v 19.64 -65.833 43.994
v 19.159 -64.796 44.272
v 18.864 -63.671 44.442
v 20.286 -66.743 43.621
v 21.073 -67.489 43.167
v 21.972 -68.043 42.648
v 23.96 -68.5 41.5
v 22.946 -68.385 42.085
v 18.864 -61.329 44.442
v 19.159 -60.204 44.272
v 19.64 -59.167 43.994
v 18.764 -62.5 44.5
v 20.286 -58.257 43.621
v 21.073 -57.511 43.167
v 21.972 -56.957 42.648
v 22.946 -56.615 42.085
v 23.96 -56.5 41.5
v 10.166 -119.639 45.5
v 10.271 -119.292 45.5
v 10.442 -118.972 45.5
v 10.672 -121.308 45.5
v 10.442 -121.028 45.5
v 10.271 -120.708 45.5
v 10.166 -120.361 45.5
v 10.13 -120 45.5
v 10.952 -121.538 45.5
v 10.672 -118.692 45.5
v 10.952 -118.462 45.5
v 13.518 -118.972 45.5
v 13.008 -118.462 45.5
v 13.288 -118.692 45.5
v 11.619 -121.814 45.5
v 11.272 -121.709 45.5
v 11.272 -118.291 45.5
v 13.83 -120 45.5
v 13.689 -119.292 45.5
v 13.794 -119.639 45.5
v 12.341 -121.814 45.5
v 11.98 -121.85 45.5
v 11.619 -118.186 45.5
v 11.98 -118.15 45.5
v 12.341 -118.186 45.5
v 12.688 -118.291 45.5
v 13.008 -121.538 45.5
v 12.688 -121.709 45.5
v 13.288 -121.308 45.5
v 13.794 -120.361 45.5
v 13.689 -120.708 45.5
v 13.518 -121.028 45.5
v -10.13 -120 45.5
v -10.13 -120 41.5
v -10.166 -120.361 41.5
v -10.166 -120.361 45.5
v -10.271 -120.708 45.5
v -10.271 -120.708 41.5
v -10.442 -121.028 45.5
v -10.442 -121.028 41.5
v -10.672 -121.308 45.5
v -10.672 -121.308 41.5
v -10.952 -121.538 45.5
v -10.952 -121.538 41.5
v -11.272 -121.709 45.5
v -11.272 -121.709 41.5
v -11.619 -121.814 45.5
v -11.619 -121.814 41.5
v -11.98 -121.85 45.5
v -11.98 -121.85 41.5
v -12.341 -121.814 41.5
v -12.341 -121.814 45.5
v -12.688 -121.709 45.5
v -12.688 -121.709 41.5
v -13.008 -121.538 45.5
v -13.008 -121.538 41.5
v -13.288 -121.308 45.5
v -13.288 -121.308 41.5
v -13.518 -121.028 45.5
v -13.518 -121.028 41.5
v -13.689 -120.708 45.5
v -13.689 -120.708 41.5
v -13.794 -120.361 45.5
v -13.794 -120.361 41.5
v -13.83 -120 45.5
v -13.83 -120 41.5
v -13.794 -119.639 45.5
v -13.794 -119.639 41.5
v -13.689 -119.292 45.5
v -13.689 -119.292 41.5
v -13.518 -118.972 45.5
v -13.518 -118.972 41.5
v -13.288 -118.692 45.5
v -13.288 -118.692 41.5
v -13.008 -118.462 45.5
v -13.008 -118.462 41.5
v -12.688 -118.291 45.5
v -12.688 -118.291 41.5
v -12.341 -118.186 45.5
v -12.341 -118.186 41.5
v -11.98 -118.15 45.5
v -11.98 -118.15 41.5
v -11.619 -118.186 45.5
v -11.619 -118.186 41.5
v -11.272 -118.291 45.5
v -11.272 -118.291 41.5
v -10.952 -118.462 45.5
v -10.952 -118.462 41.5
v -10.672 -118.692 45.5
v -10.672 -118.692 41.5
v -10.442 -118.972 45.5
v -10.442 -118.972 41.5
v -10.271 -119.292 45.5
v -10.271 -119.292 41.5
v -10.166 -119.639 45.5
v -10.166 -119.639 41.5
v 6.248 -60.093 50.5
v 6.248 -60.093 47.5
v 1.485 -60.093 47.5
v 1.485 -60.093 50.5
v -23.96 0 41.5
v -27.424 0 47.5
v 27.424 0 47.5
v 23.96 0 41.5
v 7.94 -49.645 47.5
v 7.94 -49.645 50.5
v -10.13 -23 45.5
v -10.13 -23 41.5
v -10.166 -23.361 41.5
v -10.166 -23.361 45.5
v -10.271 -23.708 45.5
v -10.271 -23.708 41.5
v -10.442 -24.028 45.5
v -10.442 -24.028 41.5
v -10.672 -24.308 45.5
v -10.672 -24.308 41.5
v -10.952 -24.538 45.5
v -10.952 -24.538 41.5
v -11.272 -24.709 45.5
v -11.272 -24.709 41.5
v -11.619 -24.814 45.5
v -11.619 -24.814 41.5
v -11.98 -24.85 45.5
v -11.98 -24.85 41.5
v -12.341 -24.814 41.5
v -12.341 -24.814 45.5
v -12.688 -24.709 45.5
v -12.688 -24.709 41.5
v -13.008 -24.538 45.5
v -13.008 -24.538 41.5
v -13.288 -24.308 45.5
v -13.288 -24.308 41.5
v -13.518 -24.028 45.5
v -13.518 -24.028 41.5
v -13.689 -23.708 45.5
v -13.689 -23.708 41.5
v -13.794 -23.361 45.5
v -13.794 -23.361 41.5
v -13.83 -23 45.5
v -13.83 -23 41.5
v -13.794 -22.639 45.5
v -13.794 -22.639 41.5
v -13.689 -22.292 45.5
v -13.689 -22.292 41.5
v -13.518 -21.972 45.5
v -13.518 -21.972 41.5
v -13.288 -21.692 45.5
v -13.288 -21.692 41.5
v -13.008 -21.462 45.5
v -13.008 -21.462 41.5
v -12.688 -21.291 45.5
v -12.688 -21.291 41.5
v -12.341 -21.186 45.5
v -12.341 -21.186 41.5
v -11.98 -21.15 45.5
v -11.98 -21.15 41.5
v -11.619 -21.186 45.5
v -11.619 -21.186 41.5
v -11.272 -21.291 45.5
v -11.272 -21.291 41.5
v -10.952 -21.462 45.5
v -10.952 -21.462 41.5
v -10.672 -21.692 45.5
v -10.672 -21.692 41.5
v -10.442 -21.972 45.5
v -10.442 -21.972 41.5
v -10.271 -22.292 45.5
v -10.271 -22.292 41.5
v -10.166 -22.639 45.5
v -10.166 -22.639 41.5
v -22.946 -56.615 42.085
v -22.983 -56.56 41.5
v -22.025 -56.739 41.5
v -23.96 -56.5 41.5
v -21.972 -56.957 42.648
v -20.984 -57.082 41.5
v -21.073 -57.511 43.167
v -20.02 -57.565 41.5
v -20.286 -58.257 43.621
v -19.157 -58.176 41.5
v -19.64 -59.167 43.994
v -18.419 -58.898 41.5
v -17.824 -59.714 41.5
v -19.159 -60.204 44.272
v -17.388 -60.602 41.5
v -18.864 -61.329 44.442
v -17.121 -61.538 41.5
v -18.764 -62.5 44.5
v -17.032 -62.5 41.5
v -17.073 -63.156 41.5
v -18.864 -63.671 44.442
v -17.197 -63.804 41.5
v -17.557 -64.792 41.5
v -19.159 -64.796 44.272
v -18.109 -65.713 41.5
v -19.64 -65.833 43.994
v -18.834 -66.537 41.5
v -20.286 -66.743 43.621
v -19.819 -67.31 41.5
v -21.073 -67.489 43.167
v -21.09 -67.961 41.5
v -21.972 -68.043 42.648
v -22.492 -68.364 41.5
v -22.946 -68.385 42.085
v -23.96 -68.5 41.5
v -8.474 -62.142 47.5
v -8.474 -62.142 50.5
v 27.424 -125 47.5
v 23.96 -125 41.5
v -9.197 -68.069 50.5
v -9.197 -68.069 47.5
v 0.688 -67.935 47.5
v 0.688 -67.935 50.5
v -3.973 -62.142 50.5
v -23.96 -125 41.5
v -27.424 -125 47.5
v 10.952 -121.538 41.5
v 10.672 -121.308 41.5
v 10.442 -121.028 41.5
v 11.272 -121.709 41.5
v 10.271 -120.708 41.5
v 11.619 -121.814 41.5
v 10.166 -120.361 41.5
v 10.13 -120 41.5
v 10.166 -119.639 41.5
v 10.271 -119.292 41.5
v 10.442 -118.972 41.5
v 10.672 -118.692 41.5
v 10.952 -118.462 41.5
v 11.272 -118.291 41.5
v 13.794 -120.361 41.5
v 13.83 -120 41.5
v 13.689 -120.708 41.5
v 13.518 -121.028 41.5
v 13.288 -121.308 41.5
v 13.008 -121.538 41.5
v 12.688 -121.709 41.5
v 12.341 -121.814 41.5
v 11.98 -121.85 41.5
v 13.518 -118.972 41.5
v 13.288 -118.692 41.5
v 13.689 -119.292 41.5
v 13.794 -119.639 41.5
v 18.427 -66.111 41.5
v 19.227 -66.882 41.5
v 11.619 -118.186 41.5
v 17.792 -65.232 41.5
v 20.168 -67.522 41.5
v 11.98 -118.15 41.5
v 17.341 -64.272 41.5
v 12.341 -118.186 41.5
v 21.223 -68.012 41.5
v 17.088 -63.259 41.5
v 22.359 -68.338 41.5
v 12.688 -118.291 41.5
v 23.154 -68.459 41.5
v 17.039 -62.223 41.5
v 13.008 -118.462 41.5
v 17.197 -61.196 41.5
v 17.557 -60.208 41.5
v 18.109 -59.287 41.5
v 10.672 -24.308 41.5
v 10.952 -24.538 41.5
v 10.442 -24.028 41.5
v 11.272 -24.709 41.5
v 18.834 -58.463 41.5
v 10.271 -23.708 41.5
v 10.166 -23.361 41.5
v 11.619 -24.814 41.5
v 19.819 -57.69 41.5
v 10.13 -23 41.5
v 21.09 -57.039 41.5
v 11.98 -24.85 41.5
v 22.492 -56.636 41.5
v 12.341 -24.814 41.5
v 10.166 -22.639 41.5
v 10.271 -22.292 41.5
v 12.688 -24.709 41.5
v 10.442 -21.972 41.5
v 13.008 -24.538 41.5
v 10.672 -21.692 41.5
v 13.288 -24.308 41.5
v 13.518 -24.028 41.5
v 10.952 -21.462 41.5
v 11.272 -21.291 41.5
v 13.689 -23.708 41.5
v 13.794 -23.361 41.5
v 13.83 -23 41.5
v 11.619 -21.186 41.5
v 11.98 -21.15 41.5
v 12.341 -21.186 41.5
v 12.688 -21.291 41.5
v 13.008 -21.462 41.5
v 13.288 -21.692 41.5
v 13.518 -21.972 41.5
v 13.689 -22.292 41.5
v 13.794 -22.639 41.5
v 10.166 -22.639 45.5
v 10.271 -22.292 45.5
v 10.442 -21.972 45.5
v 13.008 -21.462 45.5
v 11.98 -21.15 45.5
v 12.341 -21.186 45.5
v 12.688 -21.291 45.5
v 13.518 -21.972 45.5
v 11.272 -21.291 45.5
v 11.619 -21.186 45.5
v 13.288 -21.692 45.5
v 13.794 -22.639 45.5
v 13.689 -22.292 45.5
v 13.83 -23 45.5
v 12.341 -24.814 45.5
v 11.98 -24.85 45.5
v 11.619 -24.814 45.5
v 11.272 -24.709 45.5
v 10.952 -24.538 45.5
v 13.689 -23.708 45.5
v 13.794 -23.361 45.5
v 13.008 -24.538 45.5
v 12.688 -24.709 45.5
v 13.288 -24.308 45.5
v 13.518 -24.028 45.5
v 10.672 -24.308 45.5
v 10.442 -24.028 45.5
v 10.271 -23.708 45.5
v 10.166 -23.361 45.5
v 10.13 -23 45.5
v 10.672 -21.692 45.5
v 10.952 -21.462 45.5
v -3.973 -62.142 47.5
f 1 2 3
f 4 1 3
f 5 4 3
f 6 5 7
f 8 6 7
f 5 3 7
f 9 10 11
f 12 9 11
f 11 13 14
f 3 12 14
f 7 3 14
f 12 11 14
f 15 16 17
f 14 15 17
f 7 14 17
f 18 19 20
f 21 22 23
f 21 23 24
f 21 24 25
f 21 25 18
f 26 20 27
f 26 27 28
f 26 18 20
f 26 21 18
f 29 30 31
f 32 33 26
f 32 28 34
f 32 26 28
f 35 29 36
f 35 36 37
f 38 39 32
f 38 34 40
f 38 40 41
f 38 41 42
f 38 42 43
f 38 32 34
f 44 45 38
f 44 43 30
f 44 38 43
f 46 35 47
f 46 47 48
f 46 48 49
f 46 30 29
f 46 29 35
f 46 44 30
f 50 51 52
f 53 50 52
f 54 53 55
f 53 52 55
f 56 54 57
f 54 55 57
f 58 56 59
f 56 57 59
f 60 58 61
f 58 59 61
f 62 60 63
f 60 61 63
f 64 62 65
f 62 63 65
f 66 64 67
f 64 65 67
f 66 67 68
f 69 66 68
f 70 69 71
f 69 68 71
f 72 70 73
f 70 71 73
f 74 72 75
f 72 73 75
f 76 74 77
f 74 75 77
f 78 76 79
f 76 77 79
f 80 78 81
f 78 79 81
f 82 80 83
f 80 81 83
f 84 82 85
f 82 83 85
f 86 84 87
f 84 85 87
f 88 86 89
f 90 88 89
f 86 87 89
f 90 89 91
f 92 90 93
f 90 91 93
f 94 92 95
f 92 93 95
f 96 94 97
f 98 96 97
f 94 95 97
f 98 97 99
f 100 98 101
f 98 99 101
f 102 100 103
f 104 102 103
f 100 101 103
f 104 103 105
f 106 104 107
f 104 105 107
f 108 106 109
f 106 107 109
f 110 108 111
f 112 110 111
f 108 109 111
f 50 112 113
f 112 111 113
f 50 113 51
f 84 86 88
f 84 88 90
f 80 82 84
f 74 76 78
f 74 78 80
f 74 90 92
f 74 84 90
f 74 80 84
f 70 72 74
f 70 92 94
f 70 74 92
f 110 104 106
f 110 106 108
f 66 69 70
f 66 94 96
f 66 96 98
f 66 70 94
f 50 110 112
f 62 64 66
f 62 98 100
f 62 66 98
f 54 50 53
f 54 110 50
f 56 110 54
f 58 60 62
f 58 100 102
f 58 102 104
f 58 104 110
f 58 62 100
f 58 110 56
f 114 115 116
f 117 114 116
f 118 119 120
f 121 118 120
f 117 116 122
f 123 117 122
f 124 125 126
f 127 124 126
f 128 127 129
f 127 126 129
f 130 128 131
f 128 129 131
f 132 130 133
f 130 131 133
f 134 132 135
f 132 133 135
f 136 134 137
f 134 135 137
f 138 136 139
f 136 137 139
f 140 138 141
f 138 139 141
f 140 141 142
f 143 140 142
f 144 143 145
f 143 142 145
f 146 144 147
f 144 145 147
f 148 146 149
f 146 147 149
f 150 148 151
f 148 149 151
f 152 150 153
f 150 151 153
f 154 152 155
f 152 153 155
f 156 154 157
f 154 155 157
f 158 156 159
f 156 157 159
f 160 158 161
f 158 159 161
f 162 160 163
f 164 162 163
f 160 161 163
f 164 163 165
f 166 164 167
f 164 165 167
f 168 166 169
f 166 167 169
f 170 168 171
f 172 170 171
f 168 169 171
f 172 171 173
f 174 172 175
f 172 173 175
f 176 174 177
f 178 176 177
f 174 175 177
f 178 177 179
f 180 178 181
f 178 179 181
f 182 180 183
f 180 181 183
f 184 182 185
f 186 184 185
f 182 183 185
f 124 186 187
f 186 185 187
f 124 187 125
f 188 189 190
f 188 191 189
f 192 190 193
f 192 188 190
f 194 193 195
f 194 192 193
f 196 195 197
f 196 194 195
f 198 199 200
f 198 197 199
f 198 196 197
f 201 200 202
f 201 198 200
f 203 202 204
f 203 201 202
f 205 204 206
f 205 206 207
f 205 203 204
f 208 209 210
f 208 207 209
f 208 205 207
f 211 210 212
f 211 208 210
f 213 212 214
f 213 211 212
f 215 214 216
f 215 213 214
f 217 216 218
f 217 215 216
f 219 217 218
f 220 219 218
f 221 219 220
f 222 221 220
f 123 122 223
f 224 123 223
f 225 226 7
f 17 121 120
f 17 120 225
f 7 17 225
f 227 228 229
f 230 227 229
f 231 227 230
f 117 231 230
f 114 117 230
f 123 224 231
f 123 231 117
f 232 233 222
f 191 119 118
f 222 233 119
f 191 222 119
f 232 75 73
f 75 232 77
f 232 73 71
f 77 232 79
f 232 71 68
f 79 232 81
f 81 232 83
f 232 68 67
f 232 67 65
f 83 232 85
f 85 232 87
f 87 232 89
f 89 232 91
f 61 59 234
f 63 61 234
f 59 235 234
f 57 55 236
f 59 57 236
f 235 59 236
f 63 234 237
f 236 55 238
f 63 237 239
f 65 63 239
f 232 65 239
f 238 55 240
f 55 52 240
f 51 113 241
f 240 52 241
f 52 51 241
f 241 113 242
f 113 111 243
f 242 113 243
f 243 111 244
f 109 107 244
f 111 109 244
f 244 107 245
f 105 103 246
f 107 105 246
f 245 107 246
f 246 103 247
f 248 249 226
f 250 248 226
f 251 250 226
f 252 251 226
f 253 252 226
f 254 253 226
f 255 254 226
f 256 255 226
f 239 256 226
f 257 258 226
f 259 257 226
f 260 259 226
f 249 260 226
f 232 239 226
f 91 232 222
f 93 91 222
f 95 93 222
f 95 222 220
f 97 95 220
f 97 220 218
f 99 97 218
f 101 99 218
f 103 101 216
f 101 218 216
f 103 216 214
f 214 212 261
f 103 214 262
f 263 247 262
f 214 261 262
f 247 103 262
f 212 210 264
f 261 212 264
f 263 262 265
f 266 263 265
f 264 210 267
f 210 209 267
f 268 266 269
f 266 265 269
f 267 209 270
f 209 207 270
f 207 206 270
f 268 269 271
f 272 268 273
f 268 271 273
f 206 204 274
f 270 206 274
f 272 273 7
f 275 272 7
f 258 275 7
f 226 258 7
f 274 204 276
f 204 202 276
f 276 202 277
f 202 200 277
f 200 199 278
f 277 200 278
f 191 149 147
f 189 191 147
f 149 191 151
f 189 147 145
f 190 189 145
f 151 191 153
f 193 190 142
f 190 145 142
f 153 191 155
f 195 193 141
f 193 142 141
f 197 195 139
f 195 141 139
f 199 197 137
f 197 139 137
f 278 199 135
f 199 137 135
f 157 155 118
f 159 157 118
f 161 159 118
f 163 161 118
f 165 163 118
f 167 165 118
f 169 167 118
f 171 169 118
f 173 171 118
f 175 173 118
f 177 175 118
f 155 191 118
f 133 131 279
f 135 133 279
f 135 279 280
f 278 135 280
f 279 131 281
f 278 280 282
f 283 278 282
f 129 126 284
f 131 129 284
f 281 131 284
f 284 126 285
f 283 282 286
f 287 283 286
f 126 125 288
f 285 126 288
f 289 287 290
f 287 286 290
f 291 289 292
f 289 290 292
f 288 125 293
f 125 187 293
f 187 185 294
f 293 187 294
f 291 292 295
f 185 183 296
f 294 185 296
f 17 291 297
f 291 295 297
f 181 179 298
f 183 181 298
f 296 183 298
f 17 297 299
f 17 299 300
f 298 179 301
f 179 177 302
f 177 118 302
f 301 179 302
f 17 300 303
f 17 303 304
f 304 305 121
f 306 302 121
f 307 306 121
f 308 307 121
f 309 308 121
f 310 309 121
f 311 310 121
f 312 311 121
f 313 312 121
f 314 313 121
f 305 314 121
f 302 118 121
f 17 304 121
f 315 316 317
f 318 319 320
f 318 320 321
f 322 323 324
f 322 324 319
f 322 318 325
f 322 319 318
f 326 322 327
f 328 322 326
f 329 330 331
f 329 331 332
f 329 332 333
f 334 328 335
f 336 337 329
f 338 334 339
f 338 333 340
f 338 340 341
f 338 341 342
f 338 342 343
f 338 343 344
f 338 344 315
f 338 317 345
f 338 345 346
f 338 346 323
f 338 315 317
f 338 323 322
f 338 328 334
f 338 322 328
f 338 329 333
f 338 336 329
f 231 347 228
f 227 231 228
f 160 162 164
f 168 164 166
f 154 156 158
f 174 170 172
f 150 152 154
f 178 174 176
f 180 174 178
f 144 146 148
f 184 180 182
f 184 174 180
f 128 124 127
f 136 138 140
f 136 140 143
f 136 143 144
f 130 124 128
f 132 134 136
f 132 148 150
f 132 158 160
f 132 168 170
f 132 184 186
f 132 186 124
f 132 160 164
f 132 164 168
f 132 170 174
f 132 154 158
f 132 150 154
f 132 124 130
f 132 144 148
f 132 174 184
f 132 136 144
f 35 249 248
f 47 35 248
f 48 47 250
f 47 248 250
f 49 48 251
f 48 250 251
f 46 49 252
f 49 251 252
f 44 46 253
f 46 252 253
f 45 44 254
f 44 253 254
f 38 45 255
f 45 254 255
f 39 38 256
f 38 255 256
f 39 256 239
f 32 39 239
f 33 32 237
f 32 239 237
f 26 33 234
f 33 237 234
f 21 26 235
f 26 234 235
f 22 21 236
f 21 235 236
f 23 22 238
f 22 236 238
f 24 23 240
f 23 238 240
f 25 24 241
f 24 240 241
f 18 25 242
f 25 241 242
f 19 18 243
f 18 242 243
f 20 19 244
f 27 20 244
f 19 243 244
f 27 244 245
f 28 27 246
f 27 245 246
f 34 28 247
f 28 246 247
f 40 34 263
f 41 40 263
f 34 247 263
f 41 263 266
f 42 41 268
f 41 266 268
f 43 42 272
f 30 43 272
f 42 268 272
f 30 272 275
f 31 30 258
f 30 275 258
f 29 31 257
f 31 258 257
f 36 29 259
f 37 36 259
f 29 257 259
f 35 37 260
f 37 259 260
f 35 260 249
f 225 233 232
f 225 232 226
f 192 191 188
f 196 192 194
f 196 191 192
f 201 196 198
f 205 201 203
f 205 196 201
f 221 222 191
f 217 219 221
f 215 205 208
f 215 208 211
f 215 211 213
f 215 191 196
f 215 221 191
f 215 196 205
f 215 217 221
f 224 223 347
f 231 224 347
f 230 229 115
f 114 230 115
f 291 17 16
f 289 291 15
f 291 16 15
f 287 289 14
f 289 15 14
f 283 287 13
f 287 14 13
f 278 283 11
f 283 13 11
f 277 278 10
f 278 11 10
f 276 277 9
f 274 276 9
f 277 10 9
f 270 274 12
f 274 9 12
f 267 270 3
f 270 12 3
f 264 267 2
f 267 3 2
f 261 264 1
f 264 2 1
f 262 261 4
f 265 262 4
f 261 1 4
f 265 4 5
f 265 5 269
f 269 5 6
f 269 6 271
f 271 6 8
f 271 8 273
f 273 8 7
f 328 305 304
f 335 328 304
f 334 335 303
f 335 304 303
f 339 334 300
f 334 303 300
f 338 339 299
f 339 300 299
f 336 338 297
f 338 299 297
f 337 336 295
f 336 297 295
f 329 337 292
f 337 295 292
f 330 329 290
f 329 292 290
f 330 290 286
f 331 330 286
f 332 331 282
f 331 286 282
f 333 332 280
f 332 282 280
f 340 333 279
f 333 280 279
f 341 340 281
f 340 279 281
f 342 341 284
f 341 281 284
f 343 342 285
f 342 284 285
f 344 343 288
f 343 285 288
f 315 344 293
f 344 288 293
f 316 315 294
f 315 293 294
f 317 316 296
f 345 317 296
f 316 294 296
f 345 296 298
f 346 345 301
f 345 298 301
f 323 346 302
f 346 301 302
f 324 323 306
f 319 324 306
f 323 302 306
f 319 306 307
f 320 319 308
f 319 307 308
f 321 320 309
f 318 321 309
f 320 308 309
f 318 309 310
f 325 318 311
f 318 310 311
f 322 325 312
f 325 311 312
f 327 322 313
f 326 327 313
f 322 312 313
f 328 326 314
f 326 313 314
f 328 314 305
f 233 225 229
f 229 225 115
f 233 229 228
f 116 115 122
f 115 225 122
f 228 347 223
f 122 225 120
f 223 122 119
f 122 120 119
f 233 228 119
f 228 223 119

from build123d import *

# Parameters (mm, degrees)
F1_DEPTH  = 125
F2_R      = 1.85
F3_DEPTH  = 4
F5_DEPTH  = 3
F7_R      = 6
F8_DEPTH  = 25
F10_R     = 6
F11_DEPTH = 25


with BuildPart() as f1:
    # F0 (on Front) → F1 (new body)
    with BuildSketch(Plane.XZ):
        Polygon((27.424138, 47.5), (-27.424138, 47.5), (-23.960036, 41.5), (23.960036, 41.5), align=None)
    extrude(amount=F1_DEPTH)

    # F2 (on face) → F3 (cut)
    with BuildSketch(Plane(origin=(0, 0, 41.5), x_dir=(1, 0, 0), z_dir=(0, 0, -1))):
        with BuildLine():
            ThreePointArc((-13.830018, 120), (-11.980018, 118.15), (-10.130018, 120))
            Line((-10.130018, 120), (-13.830018, 120))
        make_face()
        with BuildLine():
            Line((-13.830018, 120), (-10.130018, 120))
            ThreePointArc((-10.130018, 120), (-11.980018, 121.85), (-13.830018, 120))
        make_face()
        with Locations((11.980018, 120)):
            Circle(F2_R)
        with BuildLine():
            ThreePointArc((-13.830018, 23), (-11.980018, 21.15), (-10.130018, 23))
            Line((-10.130018, 23), (-13.830018, 23))
        make_face()
        with BuildLine():
            Line((-13.830018, 23), (-10.130018, 23))
            ThreePointArc((-10.130018, 23), (-11.980018, 24.85), (-13.830018, 23))
        make_face()
        with Locations((11.980018, 23)):
            Circle(F2_R)
    extrude(amount=-F3_DEPTH, mode=Mode.SUBTRACT)

    # F4 (on face) → F5 (join)
    with BuildSketch(Plane.XY.offset(47.5)):
        Polygon((-3.973212, -62.142442), (-9.196524, -68.068704), (0.688378, -67.934791), (6.248204, -60.093163), (1.484625, -60.093163), (7.940114, -49.645284), (-8.473853, -62.142442), align=None)
    extrude(amount=F5_DEPTH)

    # F7 (on face) → F8 (cut)
    with BuildSketch(Plane(origin=(-23.960036, 0, 41.5), x_dir=(0.866025, 0, 0.5), z_dir=(0.5, 0, -0.866025))):
        with Locations((0, 62.5)):
            Circle(F7_R)
    extrude(amount=F8_DEPTH, mode=Mode.SUBTRACT)

    # F10 (on face) → F11 (cut)
    with BuildSketch(Plane(origin=(23.960036, 0, 41.5), x_dir=(0.866025, 0, -0.5), z_dir=(0.5, 0, 0.866025))):
        with Locations((0, -62.5)):
            Circle(F10_R)
    extrude(amount=-F11_DEPTH, mode=Mode.SUBTRACT)


solid = f1.part
